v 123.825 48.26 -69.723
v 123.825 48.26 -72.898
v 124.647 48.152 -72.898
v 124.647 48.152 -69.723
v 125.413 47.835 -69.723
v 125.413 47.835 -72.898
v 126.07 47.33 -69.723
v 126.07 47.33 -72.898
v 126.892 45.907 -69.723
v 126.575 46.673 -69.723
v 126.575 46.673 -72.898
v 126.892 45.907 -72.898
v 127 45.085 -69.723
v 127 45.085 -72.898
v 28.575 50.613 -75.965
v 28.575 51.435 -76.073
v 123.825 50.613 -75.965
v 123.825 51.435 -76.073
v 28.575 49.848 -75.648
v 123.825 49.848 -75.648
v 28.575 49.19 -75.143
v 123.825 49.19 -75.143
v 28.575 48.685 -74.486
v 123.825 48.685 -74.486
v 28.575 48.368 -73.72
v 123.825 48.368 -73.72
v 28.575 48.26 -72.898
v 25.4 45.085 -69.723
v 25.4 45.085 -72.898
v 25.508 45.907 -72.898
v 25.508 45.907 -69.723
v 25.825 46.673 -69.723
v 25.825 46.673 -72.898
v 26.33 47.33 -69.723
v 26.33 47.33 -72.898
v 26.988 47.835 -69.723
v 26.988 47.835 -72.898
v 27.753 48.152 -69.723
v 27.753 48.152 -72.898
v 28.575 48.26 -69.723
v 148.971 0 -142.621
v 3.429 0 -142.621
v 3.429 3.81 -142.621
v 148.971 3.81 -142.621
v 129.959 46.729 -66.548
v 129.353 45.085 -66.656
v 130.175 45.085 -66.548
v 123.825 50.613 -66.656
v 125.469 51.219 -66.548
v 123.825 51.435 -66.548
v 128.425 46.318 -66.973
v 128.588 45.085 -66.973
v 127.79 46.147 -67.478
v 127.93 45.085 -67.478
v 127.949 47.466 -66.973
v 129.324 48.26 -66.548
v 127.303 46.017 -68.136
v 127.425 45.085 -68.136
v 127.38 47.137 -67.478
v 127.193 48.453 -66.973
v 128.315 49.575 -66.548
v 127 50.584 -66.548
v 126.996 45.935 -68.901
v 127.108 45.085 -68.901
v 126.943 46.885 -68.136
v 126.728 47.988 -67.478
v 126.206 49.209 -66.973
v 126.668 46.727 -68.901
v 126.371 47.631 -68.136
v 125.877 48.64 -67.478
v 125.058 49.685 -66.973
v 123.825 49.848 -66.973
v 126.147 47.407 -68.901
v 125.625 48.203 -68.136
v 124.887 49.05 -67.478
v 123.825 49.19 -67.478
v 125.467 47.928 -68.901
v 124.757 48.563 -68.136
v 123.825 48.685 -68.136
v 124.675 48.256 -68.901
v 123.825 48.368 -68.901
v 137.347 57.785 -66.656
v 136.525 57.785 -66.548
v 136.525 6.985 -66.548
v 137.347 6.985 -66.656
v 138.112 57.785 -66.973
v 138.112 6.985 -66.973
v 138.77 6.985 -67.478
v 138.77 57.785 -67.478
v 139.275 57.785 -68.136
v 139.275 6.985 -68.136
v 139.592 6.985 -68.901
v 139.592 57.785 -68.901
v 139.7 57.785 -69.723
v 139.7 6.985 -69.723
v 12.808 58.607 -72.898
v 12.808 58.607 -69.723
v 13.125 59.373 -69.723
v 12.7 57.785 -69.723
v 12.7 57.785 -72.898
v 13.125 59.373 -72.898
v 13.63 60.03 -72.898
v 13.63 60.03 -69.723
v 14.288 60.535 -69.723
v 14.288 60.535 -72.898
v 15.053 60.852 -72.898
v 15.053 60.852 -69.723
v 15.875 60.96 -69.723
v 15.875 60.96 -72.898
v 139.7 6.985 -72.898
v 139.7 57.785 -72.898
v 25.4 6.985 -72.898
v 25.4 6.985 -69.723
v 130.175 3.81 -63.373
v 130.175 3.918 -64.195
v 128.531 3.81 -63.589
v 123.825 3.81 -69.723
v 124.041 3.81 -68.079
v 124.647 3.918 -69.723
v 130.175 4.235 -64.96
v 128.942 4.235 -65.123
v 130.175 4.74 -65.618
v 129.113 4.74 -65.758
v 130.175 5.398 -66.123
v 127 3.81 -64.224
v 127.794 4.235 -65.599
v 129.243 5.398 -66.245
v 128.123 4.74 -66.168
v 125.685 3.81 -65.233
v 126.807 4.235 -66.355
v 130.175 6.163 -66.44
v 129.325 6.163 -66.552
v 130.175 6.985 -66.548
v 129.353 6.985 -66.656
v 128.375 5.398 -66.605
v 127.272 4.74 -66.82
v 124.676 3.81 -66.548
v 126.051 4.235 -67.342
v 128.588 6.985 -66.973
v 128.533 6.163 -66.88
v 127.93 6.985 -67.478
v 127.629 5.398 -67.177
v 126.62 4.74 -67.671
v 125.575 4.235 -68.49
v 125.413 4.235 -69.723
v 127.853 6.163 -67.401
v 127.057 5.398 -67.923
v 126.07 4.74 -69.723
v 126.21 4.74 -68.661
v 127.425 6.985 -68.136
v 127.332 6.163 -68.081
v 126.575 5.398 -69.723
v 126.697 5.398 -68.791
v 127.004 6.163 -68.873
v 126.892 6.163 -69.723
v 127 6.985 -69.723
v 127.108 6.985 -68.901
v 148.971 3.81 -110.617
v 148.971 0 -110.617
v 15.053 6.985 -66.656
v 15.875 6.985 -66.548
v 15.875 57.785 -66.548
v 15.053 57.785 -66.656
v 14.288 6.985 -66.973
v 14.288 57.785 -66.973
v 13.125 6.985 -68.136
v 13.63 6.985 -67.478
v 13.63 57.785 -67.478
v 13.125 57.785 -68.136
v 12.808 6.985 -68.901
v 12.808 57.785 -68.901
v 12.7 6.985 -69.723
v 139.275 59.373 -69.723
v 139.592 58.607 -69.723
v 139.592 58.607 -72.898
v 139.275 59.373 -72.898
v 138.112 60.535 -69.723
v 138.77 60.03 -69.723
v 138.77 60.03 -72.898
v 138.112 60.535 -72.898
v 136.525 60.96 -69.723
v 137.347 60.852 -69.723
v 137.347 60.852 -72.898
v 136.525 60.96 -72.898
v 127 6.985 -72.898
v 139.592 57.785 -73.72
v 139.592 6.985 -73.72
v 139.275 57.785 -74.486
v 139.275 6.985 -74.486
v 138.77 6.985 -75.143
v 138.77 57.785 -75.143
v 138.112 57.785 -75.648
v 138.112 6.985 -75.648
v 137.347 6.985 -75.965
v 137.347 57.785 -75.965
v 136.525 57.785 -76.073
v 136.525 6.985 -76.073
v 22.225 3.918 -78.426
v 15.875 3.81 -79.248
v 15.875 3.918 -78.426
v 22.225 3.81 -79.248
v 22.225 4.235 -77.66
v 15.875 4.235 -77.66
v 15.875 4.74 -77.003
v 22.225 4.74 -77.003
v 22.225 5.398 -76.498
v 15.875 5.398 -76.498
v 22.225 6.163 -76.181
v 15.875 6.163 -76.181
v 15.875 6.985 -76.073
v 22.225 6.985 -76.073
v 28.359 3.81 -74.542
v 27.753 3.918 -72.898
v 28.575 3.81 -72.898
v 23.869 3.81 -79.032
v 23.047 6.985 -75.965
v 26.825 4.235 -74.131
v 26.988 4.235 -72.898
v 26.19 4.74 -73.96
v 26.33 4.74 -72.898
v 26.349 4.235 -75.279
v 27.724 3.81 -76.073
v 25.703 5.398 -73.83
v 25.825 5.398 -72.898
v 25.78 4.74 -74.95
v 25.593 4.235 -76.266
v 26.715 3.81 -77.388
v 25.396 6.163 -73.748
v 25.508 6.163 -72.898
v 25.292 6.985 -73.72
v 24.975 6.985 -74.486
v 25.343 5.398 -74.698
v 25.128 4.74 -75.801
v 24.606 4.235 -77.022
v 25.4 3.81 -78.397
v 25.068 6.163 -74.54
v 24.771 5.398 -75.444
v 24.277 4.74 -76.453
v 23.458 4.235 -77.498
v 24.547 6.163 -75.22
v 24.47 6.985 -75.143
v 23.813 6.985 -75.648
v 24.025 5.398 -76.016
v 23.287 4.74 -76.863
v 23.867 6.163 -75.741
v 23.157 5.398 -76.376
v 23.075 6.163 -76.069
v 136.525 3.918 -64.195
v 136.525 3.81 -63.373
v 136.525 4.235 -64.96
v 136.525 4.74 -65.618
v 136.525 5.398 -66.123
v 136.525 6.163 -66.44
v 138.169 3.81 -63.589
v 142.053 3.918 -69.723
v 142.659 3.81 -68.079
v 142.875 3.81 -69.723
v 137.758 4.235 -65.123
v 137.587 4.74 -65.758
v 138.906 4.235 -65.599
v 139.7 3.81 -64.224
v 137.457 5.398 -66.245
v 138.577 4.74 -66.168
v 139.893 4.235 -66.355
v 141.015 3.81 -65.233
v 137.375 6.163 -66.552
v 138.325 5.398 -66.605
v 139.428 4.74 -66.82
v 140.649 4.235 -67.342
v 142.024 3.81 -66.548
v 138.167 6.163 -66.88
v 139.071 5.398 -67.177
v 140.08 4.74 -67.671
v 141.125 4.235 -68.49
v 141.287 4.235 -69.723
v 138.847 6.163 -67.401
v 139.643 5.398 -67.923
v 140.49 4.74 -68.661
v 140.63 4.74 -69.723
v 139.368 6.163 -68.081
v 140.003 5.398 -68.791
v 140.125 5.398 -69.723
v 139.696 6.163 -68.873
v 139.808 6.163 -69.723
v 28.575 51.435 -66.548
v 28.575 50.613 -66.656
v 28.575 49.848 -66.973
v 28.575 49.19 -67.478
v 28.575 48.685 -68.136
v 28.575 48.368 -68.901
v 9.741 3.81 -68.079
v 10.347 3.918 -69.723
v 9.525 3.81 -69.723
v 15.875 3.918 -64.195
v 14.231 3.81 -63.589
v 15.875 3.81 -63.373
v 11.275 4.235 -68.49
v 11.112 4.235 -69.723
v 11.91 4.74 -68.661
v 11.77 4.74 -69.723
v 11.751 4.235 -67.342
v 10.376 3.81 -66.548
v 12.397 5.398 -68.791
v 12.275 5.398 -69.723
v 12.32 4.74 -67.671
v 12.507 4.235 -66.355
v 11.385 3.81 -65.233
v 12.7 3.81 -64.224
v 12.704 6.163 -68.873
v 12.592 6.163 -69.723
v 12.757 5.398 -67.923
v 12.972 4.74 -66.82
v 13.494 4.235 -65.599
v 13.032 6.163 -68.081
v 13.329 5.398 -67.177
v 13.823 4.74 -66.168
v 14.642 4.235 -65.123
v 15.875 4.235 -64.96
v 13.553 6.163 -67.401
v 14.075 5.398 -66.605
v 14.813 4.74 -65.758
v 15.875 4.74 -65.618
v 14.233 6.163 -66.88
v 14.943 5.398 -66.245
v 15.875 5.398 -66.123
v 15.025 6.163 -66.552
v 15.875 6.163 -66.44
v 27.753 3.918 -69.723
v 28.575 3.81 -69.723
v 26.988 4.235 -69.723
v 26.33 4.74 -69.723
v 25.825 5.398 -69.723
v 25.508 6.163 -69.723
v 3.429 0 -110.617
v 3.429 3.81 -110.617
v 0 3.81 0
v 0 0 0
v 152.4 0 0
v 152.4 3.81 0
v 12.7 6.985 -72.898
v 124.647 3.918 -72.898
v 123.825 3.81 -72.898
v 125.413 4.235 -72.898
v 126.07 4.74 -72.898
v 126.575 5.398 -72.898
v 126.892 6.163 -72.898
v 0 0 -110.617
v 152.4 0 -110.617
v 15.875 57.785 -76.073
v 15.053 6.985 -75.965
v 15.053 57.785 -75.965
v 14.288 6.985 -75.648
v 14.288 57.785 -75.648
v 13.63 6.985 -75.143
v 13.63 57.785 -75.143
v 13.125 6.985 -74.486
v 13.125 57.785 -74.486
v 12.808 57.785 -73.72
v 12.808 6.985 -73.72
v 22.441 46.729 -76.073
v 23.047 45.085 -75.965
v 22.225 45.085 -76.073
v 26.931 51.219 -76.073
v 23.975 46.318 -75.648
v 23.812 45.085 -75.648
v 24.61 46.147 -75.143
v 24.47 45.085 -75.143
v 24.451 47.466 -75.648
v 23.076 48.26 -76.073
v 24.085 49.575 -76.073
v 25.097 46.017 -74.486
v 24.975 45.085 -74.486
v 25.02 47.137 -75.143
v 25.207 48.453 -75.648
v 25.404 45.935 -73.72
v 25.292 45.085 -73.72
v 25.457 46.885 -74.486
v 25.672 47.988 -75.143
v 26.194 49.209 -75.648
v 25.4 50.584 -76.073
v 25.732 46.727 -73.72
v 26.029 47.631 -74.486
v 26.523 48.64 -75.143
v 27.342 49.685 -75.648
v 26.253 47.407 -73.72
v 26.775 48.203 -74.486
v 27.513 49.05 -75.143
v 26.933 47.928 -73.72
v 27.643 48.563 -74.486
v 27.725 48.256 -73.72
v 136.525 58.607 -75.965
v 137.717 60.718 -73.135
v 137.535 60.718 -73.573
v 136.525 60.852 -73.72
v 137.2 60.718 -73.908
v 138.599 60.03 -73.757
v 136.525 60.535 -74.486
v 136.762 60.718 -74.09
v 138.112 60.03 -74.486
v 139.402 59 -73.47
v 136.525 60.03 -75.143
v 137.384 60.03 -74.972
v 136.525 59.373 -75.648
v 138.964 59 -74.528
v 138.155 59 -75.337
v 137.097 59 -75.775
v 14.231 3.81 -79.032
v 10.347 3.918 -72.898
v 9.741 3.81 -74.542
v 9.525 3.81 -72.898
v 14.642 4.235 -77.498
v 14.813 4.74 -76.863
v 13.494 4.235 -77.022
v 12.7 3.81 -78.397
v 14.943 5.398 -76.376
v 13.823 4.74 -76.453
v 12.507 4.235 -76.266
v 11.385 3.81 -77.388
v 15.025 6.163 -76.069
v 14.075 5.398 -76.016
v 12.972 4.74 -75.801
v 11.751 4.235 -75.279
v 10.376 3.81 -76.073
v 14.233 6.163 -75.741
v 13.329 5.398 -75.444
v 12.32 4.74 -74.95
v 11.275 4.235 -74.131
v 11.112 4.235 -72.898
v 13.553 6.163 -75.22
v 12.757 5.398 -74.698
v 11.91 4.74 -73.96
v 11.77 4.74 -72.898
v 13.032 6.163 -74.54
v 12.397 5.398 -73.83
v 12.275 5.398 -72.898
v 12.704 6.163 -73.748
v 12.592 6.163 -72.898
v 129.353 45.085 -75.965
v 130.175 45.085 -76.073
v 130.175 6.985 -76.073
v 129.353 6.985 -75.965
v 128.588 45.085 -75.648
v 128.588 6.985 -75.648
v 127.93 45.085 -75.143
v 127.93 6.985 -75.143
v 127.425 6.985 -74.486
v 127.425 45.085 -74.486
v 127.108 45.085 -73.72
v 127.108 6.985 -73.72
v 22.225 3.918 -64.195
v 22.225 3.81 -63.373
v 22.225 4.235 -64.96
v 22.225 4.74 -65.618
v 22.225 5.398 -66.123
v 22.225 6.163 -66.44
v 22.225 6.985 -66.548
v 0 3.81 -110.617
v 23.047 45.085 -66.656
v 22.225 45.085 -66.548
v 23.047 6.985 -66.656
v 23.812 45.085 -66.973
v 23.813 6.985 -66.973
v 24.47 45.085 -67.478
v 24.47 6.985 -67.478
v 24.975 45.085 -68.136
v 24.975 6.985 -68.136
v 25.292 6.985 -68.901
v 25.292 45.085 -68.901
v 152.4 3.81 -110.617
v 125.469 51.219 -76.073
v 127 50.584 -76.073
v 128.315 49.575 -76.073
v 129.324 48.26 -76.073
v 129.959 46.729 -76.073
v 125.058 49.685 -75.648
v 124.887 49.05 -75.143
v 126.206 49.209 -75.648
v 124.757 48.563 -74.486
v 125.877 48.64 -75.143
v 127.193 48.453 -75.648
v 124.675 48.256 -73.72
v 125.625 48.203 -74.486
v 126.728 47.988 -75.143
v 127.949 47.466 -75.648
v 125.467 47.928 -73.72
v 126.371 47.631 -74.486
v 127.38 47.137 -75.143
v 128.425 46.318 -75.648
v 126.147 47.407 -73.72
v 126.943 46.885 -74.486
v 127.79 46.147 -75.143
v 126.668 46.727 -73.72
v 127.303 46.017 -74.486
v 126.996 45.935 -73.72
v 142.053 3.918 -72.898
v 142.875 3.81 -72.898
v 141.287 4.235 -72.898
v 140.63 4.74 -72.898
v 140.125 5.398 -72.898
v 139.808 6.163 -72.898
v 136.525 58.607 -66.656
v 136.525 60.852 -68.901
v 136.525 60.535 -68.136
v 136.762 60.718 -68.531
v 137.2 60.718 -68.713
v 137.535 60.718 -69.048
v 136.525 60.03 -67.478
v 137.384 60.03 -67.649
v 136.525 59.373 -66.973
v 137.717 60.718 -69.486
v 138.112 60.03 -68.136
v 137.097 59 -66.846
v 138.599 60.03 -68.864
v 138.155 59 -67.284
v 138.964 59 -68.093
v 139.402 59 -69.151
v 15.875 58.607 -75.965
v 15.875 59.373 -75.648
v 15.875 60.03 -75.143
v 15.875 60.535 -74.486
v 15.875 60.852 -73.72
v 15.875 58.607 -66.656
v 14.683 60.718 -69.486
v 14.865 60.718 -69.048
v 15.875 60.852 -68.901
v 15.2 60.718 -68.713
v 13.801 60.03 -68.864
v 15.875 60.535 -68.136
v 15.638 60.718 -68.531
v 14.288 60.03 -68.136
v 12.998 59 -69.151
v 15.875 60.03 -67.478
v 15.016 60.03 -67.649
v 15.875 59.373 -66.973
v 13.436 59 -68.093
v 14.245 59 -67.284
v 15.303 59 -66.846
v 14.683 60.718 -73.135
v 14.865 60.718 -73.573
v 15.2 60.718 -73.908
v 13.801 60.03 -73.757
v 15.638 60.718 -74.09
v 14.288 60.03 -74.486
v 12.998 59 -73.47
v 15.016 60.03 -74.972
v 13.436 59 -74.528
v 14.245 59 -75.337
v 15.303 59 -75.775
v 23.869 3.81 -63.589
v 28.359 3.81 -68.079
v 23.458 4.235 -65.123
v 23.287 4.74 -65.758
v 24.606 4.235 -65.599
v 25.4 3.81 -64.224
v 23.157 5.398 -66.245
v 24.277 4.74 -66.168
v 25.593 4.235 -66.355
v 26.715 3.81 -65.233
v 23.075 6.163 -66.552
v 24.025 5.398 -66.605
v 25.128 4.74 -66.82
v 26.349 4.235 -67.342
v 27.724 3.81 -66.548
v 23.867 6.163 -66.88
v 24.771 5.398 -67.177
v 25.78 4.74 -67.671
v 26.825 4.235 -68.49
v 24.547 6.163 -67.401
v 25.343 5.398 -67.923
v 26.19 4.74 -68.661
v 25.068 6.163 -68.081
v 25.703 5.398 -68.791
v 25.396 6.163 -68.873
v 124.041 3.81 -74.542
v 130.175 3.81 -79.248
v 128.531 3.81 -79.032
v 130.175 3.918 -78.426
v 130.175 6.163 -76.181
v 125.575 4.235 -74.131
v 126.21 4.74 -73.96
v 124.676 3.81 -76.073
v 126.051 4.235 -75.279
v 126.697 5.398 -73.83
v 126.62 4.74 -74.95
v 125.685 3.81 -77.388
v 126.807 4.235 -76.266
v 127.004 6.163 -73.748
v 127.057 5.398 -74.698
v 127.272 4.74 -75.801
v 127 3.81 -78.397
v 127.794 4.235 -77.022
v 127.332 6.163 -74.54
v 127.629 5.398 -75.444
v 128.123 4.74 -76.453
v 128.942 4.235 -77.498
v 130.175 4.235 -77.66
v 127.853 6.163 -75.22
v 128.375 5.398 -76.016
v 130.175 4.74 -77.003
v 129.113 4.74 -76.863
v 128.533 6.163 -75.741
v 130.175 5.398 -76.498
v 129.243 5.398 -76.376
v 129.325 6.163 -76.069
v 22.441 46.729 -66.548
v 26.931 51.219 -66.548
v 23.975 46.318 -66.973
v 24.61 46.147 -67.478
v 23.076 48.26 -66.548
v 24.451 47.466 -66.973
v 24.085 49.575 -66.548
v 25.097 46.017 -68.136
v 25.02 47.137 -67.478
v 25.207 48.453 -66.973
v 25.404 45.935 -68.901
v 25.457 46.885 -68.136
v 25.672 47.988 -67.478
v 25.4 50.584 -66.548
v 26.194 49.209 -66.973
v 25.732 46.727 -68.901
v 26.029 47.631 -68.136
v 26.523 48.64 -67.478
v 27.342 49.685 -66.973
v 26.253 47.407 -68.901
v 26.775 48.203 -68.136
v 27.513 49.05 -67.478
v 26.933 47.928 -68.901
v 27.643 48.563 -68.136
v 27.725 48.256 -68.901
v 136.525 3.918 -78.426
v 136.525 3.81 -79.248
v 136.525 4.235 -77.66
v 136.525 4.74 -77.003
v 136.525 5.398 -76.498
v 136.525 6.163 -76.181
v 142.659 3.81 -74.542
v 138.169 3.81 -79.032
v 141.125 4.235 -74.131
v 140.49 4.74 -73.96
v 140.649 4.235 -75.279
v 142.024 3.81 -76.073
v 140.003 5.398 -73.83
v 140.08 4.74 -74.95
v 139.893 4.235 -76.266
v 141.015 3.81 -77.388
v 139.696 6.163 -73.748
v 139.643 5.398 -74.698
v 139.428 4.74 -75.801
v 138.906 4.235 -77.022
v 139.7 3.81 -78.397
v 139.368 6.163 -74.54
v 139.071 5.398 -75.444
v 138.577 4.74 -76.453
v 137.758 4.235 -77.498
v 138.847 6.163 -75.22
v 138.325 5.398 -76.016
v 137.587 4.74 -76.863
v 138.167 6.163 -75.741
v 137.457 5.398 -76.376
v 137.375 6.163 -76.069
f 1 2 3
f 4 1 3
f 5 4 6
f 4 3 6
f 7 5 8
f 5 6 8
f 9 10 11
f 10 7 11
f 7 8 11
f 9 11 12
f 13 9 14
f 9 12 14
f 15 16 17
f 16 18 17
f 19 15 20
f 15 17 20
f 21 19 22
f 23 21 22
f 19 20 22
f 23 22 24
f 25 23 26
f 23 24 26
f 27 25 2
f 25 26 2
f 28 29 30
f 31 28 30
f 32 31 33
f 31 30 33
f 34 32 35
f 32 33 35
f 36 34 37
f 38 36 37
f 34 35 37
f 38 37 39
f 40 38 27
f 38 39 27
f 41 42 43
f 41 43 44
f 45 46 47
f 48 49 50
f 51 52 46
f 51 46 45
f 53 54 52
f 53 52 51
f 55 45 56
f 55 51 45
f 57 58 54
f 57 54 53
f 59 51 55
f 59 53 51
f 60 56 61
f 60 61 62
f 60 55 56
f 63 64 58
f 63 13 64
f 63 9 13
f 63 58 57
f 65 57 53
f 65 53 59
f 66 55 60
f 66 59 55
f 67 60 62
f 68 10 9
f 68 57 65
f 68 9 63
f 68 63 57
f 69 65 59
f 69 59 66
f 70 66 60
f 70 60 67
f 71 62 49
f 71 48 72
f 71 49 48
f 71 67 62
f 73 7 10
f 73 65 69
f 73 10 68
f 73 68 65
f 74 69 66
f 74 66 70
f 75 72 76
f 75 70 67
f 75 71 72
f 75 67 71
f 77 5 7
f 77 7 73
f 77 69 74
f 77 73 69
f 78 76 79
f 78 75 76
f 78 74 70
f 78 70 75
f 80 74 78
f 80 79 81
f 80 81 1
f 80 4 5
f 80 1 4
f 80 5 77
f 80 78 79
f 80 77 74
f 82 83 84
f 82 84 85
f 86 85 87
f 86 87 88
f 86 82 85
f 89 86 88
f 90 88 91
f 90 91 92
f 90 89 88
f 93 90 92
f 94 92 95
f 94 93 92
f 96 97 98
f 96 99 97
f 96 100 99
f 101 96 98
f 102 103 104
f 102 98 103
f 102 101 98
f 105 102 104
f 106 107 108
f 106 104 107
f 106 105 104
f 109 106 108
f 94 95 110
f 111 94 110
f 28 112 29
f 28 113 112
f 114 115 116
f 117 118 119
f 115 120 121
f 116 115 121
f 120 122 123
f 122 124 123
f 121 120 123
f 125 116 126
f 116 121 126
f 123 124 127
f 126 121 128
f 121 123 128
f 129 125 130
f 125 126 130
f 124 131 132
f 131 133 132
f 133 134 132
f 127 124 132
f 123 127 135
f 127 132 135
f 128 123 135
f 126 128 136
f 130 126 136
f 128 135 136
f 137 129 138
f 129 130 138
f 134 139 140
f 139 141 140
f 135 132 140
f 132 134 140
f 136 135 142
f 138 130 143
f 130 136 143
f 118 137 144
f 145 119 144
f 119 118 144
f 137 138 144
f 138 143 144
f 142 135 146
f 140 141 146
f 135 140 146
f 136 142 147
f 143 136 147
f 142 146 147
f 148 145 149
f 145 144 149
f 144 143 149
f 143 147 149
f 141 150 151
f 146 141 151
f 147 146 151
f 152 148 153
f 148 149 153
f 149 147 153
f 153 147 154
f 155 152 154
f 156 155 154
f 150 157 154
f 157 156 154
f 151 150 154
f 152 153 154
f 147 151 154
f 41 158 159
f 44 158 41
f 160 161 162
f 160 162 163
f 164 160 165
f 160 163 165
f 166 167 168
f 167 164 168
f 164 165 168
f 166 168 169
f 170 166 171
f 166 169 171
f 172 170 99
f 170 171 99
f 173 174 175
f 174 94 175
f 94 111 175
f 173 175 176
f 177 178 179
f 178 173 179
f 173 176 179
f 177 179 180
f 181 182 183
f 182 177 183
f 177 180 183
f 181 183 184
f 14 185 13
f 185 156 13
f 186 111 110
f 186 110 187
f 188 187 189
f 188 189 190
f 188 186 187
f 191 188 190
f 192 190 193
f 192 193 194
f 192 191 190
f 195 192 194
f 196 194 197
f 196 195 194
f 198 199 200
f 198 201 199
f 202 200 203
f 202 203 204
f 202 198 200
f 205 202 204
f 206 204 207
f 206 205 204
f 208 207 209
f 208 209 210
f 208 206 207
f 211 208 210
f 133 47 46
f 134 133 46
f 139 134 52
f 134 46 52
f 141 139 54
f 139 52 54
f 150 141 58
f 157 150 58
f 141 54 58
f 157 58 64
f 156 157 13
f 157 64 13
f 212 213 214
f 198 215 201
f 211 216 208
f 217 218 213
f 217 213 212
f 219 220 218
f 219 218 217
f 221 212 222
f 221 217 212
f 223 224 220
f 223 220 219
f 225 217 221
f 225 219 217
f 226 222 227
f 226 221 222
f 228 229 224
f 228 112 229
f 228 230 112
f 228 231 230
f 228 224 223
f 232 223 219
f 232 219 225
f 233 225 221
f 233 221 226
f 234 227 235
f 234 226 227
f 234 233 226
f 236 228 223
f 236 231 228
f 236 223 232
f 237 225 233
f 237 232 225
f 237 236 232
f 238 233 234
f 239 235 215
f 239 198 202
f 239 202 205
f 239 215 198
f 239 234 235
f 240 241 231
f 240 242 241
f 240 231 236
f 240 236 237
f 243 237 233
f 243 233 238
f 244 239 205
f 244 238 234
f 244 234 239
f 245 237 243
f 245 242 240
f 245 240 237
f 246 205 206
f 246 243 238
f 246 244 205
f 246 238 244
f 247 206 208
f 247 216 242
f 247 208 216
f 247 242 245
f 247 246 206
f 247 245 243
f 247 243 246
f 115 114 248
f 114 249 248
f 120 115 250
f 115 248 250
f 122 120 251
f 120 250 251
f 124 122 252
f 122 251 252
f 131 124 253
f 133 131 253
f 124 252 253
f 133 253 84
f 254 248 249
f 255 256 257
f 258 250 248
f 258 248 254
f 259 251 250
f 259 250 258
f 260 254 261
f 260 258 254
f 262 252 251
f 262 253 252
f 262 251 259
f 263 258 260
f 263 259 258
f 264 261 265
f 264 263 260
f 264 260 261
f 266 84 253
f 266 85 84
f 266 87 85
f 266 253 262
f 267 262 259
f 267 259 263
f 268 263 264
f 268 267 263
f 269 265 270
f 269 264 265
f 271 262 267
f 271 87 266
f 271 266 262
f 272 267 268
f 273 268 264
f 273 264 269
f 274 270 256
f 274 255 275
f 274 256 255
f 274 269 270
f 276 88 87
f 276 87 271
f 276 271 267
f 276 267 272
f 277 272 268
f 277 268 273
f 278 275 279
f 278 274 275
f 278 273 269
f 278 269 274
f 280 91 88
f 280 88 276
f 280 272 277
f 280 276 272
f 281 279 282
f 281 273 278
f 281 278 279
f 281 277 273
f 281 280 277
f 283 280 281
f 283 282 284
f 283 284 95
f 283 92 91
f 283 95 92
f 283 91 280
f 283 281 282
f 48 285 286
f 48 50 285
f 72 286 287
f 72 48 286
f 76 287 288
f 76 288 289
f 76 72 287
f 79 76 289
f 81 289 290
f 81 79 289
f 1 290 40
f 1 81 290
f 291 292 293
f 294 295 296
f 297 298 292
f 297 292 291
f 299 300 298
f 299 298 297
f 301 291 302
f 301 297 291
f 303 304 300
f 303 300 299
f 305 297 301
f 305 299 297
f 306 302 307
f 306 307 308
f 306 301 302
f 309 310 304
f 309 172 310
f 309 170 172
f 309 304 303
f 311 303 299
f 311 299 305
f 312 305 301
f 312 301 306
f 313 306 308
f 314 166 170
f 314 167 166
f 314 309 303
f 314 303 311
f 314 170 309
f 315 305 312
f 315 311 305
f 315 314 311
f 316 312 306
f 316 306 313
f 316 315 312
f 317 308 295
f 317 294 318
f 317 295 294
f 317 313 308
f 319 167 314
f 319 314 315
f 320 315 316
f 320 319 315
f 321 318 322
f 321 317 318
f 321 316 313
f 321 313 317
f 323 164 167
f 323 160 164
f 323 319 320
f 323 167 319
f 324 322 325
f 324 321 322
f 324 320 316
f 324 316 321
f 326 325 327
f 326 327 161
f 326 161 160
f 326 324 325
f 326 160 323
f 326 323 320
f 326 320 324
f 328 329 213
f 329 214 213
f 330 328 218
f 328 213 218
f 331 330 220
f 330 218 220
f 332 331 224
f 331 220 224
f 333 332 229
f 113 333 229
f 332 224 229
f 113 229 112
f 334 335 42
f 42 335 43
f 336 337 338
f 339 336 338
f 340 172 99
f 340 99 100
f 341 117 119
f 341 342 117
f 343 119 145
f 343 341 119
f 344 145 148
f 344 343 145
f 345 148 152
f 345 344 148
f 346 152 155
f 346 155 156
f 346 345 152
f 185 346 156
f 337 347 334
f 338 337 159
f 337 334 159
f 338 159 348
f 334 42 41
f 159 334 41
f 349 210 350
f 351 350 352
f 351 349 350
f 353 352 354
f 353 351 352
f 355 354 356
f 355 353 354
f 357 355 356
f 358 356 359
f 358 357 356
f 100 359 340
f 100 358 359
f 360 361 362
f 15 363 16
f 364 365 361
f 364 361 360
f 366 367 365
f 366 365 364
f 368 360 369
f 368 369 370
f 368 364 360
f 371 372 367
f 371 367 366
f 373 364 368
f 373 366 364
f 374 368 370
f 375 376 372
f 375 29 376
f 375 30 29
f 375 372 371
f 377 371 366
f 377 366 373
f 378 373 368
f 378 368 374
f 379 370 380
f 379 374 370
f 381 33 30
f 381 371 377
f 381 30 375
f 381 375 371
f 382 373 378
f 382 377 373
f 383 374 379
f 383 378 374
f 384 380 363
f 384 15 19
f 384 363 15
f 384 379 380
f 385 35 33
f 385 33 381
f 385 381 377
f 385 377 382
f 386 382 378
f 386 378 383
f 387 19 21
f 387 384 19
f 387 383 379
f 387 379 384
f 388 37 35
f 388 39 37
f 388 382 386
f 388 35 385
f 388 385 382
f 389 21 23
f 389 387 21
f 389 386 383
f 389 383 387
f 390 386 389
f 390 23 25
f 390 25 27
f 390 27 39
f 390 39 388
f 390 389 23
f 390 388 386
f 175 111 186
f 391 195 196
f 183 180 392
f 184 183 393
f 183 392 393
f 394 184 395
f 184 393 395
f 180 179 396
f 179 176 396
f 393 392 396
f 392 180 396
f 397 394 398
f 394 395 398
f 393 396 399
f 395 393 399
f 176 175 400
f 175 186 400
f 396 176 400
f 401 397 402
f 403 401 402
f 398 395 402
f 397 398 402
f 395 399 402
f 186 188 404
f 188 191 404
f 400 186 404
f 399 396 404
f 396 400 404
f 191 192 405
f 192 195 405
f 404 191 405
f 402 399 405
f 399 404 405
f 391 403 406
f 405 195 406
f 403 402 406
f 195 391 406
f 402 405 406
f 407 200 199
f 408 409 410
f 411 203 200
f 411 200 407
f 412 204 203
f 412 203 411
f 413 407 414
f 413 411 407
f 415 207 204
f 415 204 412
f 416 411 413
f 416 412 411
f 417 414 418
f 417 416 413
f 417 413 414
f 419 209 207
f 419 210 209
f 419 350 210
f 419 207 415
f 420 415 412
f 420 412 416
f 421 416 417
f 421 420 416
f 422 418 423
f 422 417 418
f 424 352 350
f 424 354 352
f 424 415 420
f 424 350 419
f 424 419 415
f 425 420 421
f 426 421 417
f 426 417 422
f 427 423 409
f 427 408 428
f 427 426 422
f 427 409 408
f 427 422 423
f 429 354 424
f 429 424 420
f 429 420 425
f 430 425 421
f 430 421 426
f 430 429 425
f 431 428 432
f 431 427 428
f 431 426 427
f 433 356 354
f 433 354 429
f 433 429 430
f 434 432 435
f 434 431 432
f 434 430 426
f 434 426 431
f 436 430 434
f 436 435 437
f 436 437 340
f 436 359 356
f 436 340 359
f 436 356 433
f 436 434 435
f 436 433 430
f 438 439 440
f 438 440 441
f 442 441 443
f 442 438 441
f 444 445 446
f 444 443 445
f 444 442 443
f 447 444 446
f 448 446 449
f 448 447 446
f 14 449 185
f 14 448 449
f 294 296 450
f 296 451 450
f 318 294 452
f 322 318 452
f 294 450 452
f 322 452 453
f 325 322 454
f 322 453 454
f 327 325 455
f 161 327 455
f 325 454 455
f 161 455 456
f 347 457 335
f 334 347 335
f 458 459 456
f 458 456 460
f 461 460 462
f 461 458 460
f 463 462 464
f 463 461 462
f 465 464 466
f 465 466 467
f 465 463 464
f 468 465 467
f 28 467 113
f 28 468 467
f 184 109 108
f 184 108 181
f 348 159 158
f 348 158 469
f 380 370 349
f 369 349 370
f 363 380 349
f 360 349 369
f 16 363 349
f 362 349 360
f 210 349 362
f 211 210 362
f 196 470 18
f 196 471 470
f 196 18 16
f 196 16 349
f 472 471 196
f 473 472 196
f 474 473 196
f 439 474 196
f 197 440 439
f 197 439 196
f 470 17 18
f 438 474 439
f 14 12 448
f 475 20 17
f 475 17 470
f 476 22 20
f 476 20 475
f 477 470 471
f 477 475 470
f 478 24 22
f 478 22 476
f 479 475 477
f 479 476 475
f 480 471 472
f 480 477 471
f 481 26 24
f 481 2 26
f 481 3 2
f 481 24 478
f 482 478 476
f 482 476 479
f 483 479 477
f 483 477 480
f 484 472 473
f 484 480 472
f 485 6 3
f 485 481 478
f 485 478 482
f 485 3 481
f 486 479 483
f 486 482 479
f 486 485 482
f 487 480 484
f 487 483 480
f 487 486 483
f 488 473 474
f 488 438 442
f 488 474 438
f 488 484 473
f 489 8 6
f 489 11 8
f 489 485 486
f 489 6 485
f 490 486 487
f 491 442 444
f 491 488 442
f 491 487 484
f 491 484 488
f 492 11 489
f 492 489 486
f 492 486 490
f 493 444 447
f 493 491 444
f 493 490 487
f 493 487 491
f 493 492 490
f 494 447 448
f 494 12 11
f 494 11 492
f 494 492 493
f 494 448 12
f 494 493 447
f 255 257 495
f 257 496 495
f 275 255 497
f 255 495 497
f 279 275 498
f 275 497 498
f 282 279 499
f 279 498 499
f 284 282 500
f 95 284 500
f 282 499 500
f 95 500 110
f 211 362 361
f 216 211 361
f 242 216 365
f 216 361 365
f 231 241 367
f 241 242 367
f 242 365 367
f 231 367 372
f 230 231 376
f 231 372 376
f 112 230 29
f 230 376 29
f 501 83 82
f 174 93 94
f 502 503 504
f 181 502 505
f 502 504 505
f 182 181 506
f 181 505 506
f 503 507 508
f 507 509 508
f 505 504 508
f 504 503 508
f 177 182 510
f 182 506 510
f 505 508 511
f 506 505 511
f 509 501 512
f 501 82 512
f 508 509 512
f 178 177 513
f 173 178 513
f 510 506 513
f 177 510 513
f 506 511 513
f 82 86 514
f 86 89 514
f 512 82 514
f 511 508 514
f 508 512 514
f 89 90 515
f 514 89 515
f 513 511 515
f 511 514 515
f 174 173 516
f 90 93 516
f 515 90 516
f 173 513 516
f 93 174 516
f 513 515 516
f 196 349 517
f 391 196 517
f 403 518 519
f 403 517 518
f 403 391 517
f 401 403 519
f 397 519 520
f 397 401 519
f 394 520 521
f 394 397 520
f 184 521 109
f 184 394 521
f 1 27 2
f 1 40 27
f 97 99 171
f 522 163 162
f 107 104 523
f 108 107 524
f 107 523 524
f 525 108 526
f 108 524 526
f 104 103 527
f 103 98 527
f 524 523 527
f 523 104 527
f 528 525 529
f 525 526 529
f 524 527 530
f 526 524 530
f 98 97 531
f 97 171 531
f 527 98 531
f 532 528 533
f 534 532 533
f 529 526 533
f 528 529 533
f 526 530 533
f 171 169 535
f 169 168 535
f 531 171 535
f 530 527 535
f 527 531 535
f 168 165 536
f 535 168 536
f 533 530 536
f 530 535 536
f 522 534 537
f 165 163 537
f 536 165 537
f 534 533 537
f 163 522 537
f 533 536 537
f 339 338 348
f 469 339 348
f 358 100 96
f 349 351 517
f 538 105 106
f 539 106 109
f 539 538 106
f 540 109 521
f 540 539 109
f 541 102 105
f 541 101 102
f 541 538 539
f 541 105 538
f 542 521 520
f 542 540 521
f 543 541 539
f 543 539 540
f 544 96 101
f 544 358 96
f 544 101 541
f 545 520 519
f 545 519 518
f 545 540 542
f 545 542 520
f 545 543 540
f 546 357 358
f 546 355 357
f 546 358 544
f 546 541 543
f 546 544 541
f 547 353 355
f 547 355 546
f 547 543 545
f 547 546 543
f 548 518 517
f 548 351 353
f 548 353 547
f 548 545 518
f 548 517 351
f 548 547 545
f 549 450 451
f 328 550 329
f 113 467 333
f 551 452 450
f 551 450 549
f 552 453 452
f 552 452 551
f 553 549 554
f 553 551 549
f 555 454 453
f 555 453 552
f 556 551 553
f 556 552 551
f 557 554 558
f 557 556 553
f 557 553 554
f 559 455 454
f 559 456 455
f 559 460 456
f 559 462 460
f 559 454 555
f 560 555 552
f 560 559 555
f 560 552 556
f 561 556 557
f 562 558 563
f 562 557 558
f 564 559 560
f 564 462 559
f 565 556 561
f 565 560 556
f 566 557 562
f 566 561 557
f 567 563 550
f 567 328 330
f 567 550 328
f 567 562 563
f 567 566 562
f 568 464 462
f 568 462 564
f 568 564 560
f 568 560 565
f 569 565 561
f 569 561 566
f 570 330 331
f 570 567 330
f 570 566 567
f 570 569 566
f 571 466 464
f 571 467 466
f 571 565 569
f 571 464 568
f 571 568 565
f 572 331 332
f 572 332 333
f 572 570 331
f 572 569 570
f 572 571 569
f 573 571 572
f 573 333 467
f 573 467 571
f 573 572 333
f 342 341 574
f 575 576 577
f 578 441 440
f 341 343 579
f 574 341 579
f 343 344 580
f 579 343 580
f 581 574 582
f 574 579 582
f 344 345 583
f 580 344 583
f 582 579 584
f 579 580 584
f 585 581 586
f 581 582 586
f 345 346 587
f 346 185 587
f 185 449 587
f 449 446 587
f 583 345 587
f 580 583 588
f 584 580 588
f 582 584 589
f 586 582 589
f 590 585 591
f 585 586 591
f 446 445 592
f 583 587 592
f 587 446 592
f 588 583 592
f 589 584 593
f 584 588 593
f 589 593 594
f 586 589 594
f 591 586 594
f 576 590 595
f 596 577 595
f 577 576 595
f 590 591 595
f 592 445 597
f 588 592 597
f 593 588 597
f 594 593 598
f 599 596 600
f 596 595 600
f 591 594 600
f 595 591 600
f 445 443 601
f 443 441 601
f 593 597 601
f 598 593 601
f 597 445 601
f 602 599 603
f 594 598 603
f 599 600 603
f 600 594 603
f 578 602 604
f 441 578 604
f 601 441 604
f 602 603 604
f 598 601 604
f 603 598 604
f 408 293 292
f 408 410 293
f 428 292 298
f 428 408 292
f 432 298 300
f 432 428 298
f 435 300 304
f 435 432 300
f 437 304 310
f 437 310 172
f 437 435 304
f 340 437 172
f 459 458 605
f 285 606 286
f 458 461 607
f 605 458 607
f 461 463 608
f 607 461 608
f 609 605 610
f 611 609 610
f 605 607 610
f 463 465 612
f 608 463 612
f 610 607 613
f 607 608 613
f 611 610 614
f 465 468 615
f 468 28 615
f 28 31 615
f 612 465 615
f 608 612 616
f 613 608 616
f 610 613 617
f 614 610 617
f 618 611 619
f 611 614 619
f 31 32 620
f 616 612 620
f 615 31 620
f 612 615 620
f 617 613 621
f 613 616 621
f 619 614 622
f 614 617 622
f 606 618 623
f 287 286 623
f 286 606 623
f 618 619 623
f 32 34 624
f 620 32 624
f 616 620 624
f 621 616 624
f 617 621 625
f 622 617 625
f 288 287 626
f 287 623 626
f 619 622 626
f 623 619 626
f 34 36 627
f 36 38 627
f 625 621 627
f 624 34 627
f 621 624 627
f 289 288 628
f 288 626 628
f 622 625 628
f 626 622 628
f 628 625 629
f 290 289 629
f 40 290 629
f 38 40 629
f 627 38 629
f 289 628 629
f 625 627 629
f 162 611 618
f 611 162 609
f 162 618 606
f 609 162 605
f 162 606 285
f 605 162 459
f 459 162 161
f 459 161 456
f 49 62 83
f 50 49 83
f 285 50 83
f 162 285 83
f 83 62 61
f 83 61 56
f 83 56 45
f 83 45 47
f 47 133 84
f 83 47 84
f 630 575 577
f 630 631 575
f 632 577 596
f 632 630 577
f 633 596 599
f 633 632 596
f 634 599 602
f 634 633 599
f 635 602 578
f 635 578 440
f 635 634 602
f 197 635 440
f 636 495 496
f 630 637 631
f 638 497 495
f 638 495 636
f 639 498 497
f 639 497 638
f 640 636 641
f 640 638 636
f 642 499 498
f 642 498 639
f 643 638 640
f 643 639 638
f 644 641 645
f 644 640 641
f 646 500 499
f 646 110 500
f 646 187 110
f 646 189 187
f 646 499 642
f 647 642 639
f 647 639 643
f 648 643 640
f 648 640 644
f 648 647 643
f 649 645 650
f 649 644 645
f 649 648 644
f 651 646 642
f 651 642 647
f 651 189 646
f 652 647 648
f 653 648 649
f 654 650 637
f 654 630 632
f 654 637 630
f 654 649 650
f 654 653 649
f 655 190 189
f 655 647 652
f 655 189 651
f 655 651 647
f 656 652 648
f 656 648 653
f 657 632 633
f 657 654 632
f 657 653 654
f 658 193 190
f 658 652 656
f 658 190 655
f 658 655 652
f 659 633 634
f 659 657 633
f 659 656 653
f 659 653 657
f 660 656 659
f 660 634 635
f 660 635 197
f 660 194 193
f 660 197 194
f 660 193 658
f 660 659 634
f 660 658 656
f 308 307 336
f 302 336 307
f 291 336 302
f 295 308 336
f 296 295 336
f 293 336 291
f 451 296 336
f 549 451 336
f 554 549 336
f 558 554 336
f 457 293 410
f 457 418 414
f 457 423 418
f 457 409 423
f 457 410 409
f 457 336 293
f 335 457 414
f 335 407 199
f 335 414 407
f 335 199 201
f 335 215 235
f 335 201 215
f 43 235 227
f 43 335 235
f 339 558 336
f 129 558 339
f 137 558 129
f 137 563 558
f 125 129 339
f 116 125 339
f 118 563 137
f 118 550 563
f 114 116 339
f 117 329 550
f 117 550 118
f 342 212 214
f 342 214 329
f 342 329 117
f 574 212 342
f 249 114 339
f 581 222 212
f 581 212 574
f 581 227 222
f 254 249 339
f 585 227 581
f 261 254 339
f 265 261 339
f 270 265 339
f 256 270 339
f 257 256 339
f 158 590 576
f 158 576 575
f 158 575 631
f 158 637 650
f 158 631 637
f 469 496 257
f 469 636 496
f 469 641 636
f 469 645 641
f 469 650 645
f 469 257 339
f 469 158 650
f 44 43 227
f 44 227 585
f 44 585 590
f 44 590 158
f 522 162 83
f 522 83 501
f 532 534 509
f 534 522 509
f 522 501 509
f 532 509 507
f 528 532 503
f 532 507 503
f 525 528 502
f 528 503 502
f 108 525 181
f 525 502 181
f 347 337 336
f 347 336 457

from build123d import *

# Parameters (mm, degrees)
SKETCH1_W           = 152.4
SKETCH1_H           = 142.621
BOSS_EXTRUDE1_DEPTH = 3.81
SKETCH2_W           = 127
SKETCH2_H           = 9.525
BOSS_EXTRUDE2_DEPTH = 57.15
CUT_EXTRUDE1_REACH  = 182.912
SKETCH3_W           = 101.6
SKETCH3_H           = 44.45
FILLET1_R           = 3.175
SKETCH4_W           = 3.429
SKETCH4_H           = 32.004
CUT_EXTRUDE2_DEPTH  = 217.408484448


with BuildPart() as part:
    # Sketch1 → Boss-Extrude1 (new body)
    with BuildSketch(Plane(origin=(0, 0, 0), x_dir=(1, 0, 0), z_dir=(0, 1, 0))):
        with Locations((76.2, 71.3105)):
            Rectangle(SKETCH1_W, SKETCH1_H)
    extrude(amount=BOSS_EXTRUDE1_DEPTH)

    # Sketch2 → Boss-Extrude2 (add)
    with BuildSketch(Plane(origin=(0, 3.81, 0), x_dir=(1, 0, 0), z_dir=(0, 1, 0))):
        with Locations((76.2, 71.3105)):
            Rectangle(SKETCH2_W, SKETCH2_H)
    extrude(amount=BOSS_EXTRUDE2_DEPTH)

    # Sketch3 → Cut-Extrude1 (cut, up to next)
    with BuildSketch(Plane.XY.offset(-66.548), mode=Mode.PRIVATE) as cut_extrude1_sk1:
        with Locations((76.2, 26.035)):
            Rectangle(SKETCH3_W, SKETCH3_H)
    cut_extrude1_tool1 = extrude(cut_extrude1_sk1.sketch, amount=-CUT_EXTRUDE1_REACH, mode=Mode.PRIVATE) & part.part
    add(cut_extrude1_tool1.solids().sort_by_distance((76.2, 26.035, -66.548))[0], mode=Mode.SUBTRACT)

    # Fillet1
    fillet1_edges = [part.edges().sort_by_distance(p)[0] for p in [
        (12.7, 3.81, -71.3105),
        (12.7, 32.385, -76.073),
        (19.05, 3.81, -66.548),
        (12.7, 32.385, -66.548),
        (139.7, 3.81, -71.3105),
        (139.7, 32.385, -66.548),
        (133.35, 3.81, -76.073),
        (139.7, 32.385, -76.073),
        (12.7, 60.96, -71.3105),
        (76.2, 60.96, -66.548),
        (139.7, 60.96, -71.3105),
        (76.2, 60.96, -76.073),
        (19.05, 3.81, -76.073),
        (133.35, 3.81, -66.548),
        (25.4, 26.035, -76.073),
        (76.2, 48.26, -76.073),
        (127, 26.035, -76.073),
        (25.4, 3.81, -71.3105),
        (25.4, 48.26, -71.3105),
        (127, 48.26, -71.3105),
        (127, 3.81, -71.3105),
        (25.4, 26.035, -66.548),
        (127, 26.035, -66.548),
        (76.2, 48.26, -66.548),
    ]]
    fillet(fillet1_edges, radius=FILLET1_R)

    # Sketch4 → Cut-Extrude2 (cut, through all)
    with BuildSketch(Plane(origin=(0, 3.81, 0), x_dir=(1, 0, 0), z_dir=(0, 1, 0))):
        with Locations((1.7145, 126.619)):
            Rectangle(SKETCH4_W, SKETCH4_H)
        with Locations((150.6855, 126.619)):
            Rectangle(SKETCH4_W, SKETCH4_H)
    extrude(amount=-CUT_EXTRUDE2_DEPTH, mode=Mode.SUBTRACT)


solid = part.part
